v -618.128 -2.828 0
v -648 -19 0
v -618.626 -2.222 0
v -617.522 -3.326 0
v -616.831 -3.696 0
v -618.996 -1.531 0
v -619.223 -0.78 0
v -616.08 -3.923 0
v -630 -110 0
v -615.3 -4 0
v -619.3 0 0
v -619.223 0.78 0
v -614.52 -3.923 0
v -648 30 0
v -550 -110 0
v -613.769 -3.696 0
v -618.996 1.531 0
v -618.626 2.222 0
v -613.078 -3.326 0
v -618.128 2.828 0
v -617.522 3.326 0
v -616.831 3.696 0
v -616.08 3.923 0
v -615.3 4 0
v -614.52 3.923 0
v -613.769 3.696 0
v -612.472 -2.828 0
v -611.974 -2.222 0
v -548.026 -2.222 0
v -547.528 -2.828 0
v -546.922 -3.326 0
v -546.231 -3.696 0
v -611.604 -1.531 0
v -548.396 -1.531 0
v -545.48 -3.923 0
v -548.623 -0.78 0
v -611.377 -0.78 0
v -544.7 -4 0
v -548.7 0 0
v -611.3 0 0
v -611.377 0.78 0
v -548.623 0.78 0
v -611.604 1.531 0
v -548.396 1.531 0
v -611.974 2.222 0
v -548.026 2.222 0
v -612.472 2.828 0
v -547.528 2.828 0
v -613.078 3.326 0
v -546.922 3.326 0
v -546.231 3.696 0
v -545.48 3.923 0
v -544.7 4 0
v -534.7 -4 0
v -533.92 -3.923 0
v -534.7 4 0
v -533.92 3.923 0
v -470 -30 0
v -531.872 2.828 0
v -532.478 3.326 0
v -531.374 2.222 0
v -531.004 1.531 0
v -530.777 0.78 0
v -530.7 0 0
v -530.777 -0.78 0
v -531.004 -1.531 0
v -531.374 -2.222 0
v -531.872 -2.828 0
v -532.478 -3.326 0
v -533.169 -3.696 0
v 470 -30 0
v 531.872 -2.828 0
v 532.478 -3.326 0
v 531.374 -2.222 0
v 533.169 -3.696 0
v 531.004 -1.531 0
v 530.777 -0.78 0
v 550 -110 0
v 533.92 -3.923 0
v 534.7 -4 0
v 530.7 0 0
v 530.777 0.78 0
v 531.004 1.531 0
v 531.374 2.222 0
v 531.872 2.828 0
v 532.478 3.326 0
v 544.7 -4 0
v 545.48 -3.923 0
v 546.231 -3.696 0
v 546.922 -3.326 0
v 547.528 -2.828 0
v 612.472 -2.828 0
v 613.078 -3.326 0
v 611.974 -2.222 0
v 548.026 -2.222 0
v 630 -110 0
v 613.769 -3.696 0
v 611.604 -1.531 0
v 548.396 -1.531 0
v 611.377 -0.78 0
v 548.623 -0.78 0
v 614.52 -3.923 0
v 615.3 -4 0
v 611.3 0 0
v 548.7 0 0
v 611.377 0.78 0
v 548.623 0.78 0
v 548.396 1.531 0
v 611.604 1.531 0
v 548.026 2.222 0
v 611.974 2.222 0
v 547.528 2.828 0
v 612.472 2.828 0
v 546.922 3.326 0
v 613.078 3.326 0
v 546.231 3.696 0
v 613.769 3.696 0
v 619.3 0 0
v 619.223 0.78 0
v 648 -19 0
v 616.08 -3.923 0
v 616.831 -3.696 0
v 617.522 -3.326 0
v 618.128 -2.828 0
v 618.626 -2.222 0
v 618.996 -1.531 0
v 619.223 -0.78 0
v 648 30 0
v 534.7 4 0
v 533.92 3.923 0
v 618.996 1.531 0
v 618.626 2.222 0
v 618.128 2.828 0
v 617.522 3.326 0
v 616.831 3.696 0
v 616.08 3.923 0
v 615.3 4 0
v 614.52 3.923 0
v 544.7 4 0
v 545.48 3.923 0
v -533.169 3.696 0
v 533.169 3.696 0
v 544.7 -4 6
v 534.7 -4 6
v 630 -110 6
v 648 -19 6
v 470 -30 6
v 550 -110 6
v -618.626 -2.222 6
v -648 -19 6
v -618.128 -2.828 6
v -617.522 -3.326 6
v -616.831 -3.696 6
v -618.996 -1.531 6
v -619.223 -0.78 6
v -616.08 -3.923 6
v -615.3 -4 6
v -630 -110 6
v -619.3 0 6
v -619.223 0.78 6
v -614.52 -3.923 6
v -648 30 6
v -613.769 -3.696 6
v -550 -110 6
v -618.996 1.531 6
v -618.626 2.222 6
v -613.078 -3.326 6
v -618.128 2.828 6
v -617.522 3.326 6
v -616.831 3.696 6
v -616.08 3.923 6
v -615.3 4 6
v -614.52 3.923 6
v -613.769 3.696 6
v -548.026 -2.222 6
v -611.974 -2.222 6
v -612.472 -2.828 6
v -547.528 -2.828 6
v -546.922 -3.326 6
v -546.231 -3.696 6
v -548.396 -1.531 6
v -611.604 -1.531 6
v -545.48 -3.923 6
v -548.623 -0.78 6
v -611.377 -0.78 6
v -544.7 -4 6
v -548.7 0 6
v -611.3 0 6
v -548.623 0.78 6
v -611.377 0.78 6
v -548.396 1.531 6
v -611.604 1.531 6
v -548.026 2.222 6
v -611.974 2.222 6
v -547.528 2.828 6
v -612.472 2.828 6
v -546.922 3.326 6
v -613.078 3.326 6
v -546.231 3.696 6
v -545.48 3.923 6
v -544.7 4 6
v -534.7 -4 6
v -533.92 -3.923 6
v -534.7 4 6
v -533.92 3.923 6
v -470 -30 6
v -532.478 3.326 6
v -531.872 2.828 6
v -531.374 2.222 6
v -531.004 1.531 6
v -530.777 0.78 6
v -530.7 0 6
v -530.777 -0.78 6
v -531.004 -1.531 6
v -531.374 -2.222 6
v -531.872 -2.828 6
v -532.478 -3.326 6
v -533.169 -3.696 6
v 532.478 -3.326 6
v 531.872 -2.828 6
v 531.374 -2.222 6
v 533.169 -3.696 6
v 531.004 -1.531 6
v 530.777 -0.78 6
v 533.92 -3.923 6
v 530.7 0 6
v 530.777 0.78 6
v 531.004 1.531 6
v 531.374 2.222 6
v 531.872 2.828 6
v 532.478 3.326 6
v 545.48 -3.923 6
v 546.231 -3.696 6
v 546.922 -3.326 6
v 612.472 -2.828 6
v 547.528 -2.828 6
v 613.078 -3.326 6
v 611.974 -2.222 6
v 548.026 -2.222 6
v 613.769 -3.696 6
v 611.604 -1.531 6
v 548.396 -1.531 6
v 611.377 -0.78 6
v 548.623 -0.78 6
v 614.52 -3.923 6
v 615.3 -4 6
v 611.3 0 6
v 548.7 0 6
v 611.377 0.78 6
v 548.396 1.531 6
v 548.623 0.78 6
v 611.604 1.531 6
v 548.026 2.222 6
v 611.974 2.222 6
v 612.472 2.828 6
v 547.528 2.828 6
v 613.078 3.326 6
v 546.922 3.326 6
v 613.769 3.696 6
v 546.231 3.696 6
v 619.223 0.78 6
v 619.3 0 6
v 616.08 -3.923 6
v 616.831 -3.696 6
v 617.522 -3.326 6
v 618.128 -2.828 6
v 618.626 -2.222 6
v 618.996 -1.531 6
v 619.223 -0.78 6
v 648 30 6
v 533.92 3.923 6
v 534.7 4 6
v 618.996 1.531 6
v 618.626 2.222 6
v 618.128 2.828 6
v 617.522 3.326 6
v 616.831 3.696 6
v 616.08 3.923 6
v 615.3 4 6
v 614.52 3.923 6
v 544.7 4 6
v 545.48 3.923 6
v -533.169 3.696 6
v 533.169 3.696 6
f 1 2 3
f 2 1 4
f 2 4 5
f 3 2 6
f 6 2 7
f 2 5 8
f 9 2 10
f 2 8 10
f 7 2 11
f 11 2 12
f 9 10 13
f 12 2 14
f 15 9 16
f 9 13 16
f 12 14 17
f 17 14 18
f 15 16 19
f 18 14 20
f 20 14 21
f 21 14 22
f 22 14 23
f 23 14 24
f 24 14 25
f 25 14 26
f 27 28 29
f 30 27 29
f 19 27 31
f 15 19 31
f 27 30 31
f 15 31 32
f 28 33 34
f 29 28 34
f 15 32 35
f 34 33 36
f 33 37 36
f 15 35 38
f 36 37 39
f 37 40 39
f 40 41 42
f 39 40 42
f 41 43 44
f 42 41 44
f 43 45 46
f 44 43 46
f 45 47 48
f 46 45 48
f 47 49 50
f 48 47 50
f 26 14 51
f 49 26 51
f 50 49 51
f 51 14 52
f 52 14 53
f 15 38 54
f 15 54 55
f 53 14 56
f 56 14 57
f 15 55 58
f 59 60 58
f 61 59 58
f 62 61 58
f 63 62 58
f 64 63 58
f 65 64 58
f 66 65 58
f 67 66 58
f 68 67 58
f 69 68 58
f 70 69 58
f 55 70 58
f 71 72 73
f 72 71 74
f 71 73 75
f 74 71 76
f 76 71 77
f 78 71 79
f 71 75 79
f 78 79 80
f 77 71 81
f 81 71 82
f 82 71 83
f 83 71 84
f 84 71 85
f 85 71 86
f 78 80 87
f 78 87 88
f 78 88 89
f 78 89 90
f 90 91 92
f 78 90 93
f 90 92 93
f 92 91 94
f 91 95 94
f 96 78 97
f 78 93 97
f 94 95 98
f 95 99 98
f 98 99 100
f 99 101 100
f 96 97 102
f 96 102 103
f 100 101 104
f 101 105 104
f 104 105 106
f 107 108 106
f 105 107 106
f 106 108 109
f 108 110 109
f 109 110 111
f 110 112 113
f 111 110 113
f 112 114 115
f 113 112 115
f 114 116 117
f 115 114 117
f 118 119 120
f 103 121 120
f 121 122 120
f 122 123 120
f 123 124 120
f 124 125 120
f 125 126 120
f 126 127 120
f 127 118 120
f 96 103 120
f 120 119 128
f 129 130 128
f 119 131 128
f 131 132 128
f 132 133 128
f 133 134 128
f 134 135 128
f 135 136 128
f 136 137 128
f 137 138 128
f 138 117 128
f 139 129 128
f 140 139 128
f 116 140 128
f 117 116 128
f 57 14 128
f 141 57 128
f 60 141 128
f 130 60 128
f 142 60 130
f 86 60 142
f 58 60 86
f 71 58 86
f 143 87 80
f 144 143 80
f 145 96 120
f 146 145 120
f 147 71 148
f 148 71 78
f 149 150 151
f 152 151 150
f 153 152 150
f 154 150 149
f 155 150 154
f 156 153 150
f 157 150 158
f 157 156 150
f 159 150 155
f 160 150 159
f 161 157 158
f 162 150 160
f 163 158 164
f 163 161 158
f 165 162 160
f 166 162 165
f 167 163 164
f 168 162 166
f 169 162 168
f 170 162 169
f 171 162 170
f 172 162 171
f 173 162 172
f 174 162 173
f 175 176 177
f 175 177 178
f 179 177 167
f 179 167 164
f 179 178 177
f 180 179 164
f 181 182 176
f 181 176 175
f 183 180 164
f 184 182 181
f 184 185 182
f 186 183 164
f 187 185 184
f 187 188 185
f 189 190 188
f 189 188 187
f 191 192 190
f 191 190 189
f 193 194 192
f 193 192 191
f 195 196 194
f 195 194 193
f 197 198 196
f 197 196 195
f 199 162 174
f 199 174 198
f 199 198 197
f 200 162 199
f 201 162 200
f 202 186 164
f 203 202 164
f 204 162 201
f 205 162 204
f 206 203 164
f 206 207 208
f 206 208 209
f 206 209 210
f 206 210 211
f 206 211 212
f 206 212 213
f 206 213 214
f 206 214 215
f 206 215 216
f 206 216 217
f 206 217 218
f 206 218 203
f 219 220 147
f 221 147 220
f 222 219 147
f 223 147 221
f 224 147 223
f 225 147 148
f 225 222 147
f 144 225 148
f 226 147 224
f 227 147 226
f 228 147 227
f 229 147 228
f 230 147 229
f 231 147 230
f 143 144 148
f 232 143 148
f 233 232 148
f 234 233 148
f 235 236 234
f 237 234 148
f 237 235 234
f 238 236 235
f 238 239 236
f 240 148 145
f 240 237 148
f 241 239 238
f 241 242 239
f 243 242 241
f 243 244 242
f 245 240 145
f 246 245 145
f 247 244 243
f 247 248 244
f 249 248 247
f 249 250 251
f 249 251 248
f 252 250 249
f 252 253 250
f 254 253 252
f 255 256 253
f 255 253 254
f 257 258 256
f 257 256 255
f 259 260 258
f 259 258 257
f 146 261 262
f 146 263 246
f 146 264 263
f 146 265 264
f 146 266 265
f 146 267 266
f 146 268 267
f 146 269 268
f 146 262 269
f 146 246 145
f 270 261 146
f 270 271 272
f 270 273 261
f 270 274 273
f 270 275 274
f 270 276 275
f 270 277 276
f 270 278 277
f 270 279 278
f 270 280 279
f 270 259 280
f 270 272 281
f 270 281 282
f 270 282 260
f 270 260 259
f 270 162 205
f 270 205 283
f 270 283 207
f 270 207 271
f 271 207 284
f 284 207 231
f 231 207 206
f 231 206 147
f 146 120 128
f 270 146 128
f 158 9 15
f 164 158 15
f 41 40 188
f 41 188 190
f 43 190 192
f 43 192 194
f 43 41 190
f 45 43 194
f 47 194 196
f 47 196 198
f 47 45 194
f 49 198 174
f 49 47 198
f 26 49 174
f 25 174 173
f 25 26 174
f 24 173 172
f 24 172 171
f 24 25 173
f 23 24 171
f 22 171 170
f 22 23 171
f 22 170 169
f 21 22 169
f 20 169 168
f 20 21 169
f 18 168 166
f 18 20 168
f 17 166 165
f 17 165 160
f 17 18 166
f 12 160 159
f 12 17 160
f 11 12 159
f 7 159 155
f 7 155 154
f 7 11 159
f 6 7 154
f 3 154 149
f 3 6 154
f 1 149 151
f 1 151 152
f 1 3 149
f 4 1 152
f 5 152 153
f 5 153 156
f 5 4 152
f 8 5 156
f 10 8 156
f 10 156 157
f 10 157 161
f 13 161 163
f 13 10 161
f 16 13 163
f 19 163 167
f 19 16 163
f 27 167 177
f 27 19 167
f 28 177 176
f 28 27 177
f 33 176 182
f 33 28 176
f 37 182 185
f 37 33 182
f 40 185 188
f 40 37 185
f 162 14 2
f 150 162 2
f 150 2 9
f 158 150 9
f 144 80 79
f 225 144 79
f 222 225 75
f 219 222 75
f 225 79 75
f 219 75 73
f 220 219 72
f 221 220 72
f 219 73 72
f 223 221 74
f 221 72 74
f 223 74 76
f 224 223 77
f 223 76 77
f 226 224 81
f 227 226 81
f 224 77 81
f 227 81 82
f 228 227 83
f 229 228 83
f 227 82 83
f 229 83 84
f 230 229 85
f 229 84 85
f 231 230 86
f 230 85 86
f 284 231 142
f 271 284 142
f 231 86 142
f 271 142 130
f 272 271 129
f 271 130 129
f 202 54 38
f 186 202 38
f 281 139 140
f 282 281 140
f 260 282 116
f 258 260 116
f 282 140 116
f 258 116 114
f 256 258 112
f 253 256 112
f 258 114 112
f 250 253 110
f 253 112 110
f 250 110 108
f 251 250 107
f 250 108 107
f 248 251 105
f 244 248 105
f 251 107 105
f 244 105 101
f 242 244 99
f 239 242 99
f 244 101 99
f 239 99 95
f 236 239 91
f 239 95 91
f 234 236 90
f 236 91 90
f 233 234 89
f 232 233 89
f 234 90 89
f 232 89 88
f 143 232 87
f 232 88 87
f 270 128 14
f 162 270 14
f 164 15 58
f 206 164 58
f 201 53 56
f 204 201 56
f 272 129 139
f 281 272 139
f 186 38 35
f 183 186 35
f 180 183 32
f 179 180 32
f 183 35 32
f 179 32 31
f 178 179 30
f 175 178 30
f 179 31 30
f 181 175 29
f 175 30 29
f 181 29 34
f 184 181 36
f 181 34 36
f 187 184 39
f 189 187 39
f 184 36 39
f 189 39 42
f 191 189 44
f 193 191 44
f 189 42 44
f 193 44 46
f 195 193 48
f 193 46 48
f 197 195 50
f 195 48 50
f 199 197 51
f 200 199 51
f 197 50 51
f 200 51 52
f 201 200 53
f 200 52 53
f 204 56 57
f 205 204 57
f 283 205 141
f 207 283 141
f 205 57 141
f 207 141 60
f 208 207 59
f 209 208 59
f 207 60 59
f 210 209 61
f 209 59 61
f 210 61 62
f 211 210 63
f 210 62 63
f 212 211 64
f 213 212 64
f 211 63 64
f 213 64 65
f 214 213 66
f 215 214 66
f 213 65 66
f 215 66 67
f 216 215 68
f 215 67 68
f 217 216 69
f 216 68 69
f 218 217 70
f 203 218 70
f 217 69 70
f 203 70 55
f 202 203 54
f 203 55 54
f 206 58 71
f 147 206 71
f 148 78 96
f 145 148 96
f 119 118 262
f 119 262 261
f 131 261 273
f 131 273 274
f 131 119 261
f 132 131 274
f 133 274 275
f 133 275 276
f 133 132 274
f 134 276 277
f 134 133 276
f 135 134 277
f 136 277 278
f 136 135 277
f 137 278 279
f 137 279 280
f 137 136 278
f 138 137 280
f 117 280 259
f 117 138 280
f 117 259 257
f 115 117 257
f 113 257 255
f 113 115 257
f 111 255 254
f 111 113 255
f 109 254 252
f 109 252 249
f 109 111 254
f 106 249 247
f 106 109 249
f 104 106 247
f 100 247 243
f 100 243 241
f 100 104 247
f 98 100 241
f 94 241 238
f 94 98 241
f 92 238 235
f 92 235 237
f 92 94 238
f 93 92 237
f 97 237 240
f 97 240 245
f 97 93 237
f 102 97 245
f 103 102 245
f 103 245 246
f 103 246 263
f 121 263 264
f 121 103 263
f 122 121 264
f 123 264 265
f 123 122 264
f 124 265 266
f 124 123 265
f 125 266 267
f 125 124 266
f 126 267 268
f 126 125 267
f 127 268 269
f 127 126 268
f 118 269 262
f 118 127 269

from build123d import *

# Parameters (mm, degrees)
CROQUIS1_R              = 4
SALIENTE_EXTRUIR1_DEPTH = 6


with BuildPart() as part:
    # Croquis1 → Saliente-Extruir1 (new body)
    with BuildSketch(Plane.XY):
        Polygon((-560, 30), (-600, 30), (-648, 30), (-648, -19), (-630, -110), (-600, -110), (-550, -110), (-470, -30), (470, -30), (550, -110), (600, -110), (630, -110), (648, -19), (648, 30), (600, 30), (560, 30), align=None)
        with Locations((-615.3, 0)):
            Circle(CROQUIS1_R, mode=Mode.SUBTRACT)
        with BuildLine():
            ThreePointArc((-544.7, -4), (-548.7, 0), (-544.7, 4))
            Line((-544.7, 4), (-534.7, 4))
            ThreePointArc((-534.7, 4), (-530.7, 0), (-534.7, -4))
            Line((-534.7, -4), (-544.7, -4))
        make_face(mode=Mode.SUBTRACT)
        with BuildLine():
            ThreePointArc((544.7, 4), (548.7, 0), (544.7, -4))
            Line((544.7, -4), (534.7, -4))
            ThreePointArc((534.7, -4), (530.7, 0), (534.7, 4))
            Line((534.7, 4), (544.7, 4))
        make_face(mode=Mode.SUBTRACT)
        with Locations((615.3, 0)):
            Circle(CROQUIS1_R, mode=Mode.SUBTRACT)
    extrude(amount=SALIENTE_EXTRUIR1_DEPTH)


solid = part.part
